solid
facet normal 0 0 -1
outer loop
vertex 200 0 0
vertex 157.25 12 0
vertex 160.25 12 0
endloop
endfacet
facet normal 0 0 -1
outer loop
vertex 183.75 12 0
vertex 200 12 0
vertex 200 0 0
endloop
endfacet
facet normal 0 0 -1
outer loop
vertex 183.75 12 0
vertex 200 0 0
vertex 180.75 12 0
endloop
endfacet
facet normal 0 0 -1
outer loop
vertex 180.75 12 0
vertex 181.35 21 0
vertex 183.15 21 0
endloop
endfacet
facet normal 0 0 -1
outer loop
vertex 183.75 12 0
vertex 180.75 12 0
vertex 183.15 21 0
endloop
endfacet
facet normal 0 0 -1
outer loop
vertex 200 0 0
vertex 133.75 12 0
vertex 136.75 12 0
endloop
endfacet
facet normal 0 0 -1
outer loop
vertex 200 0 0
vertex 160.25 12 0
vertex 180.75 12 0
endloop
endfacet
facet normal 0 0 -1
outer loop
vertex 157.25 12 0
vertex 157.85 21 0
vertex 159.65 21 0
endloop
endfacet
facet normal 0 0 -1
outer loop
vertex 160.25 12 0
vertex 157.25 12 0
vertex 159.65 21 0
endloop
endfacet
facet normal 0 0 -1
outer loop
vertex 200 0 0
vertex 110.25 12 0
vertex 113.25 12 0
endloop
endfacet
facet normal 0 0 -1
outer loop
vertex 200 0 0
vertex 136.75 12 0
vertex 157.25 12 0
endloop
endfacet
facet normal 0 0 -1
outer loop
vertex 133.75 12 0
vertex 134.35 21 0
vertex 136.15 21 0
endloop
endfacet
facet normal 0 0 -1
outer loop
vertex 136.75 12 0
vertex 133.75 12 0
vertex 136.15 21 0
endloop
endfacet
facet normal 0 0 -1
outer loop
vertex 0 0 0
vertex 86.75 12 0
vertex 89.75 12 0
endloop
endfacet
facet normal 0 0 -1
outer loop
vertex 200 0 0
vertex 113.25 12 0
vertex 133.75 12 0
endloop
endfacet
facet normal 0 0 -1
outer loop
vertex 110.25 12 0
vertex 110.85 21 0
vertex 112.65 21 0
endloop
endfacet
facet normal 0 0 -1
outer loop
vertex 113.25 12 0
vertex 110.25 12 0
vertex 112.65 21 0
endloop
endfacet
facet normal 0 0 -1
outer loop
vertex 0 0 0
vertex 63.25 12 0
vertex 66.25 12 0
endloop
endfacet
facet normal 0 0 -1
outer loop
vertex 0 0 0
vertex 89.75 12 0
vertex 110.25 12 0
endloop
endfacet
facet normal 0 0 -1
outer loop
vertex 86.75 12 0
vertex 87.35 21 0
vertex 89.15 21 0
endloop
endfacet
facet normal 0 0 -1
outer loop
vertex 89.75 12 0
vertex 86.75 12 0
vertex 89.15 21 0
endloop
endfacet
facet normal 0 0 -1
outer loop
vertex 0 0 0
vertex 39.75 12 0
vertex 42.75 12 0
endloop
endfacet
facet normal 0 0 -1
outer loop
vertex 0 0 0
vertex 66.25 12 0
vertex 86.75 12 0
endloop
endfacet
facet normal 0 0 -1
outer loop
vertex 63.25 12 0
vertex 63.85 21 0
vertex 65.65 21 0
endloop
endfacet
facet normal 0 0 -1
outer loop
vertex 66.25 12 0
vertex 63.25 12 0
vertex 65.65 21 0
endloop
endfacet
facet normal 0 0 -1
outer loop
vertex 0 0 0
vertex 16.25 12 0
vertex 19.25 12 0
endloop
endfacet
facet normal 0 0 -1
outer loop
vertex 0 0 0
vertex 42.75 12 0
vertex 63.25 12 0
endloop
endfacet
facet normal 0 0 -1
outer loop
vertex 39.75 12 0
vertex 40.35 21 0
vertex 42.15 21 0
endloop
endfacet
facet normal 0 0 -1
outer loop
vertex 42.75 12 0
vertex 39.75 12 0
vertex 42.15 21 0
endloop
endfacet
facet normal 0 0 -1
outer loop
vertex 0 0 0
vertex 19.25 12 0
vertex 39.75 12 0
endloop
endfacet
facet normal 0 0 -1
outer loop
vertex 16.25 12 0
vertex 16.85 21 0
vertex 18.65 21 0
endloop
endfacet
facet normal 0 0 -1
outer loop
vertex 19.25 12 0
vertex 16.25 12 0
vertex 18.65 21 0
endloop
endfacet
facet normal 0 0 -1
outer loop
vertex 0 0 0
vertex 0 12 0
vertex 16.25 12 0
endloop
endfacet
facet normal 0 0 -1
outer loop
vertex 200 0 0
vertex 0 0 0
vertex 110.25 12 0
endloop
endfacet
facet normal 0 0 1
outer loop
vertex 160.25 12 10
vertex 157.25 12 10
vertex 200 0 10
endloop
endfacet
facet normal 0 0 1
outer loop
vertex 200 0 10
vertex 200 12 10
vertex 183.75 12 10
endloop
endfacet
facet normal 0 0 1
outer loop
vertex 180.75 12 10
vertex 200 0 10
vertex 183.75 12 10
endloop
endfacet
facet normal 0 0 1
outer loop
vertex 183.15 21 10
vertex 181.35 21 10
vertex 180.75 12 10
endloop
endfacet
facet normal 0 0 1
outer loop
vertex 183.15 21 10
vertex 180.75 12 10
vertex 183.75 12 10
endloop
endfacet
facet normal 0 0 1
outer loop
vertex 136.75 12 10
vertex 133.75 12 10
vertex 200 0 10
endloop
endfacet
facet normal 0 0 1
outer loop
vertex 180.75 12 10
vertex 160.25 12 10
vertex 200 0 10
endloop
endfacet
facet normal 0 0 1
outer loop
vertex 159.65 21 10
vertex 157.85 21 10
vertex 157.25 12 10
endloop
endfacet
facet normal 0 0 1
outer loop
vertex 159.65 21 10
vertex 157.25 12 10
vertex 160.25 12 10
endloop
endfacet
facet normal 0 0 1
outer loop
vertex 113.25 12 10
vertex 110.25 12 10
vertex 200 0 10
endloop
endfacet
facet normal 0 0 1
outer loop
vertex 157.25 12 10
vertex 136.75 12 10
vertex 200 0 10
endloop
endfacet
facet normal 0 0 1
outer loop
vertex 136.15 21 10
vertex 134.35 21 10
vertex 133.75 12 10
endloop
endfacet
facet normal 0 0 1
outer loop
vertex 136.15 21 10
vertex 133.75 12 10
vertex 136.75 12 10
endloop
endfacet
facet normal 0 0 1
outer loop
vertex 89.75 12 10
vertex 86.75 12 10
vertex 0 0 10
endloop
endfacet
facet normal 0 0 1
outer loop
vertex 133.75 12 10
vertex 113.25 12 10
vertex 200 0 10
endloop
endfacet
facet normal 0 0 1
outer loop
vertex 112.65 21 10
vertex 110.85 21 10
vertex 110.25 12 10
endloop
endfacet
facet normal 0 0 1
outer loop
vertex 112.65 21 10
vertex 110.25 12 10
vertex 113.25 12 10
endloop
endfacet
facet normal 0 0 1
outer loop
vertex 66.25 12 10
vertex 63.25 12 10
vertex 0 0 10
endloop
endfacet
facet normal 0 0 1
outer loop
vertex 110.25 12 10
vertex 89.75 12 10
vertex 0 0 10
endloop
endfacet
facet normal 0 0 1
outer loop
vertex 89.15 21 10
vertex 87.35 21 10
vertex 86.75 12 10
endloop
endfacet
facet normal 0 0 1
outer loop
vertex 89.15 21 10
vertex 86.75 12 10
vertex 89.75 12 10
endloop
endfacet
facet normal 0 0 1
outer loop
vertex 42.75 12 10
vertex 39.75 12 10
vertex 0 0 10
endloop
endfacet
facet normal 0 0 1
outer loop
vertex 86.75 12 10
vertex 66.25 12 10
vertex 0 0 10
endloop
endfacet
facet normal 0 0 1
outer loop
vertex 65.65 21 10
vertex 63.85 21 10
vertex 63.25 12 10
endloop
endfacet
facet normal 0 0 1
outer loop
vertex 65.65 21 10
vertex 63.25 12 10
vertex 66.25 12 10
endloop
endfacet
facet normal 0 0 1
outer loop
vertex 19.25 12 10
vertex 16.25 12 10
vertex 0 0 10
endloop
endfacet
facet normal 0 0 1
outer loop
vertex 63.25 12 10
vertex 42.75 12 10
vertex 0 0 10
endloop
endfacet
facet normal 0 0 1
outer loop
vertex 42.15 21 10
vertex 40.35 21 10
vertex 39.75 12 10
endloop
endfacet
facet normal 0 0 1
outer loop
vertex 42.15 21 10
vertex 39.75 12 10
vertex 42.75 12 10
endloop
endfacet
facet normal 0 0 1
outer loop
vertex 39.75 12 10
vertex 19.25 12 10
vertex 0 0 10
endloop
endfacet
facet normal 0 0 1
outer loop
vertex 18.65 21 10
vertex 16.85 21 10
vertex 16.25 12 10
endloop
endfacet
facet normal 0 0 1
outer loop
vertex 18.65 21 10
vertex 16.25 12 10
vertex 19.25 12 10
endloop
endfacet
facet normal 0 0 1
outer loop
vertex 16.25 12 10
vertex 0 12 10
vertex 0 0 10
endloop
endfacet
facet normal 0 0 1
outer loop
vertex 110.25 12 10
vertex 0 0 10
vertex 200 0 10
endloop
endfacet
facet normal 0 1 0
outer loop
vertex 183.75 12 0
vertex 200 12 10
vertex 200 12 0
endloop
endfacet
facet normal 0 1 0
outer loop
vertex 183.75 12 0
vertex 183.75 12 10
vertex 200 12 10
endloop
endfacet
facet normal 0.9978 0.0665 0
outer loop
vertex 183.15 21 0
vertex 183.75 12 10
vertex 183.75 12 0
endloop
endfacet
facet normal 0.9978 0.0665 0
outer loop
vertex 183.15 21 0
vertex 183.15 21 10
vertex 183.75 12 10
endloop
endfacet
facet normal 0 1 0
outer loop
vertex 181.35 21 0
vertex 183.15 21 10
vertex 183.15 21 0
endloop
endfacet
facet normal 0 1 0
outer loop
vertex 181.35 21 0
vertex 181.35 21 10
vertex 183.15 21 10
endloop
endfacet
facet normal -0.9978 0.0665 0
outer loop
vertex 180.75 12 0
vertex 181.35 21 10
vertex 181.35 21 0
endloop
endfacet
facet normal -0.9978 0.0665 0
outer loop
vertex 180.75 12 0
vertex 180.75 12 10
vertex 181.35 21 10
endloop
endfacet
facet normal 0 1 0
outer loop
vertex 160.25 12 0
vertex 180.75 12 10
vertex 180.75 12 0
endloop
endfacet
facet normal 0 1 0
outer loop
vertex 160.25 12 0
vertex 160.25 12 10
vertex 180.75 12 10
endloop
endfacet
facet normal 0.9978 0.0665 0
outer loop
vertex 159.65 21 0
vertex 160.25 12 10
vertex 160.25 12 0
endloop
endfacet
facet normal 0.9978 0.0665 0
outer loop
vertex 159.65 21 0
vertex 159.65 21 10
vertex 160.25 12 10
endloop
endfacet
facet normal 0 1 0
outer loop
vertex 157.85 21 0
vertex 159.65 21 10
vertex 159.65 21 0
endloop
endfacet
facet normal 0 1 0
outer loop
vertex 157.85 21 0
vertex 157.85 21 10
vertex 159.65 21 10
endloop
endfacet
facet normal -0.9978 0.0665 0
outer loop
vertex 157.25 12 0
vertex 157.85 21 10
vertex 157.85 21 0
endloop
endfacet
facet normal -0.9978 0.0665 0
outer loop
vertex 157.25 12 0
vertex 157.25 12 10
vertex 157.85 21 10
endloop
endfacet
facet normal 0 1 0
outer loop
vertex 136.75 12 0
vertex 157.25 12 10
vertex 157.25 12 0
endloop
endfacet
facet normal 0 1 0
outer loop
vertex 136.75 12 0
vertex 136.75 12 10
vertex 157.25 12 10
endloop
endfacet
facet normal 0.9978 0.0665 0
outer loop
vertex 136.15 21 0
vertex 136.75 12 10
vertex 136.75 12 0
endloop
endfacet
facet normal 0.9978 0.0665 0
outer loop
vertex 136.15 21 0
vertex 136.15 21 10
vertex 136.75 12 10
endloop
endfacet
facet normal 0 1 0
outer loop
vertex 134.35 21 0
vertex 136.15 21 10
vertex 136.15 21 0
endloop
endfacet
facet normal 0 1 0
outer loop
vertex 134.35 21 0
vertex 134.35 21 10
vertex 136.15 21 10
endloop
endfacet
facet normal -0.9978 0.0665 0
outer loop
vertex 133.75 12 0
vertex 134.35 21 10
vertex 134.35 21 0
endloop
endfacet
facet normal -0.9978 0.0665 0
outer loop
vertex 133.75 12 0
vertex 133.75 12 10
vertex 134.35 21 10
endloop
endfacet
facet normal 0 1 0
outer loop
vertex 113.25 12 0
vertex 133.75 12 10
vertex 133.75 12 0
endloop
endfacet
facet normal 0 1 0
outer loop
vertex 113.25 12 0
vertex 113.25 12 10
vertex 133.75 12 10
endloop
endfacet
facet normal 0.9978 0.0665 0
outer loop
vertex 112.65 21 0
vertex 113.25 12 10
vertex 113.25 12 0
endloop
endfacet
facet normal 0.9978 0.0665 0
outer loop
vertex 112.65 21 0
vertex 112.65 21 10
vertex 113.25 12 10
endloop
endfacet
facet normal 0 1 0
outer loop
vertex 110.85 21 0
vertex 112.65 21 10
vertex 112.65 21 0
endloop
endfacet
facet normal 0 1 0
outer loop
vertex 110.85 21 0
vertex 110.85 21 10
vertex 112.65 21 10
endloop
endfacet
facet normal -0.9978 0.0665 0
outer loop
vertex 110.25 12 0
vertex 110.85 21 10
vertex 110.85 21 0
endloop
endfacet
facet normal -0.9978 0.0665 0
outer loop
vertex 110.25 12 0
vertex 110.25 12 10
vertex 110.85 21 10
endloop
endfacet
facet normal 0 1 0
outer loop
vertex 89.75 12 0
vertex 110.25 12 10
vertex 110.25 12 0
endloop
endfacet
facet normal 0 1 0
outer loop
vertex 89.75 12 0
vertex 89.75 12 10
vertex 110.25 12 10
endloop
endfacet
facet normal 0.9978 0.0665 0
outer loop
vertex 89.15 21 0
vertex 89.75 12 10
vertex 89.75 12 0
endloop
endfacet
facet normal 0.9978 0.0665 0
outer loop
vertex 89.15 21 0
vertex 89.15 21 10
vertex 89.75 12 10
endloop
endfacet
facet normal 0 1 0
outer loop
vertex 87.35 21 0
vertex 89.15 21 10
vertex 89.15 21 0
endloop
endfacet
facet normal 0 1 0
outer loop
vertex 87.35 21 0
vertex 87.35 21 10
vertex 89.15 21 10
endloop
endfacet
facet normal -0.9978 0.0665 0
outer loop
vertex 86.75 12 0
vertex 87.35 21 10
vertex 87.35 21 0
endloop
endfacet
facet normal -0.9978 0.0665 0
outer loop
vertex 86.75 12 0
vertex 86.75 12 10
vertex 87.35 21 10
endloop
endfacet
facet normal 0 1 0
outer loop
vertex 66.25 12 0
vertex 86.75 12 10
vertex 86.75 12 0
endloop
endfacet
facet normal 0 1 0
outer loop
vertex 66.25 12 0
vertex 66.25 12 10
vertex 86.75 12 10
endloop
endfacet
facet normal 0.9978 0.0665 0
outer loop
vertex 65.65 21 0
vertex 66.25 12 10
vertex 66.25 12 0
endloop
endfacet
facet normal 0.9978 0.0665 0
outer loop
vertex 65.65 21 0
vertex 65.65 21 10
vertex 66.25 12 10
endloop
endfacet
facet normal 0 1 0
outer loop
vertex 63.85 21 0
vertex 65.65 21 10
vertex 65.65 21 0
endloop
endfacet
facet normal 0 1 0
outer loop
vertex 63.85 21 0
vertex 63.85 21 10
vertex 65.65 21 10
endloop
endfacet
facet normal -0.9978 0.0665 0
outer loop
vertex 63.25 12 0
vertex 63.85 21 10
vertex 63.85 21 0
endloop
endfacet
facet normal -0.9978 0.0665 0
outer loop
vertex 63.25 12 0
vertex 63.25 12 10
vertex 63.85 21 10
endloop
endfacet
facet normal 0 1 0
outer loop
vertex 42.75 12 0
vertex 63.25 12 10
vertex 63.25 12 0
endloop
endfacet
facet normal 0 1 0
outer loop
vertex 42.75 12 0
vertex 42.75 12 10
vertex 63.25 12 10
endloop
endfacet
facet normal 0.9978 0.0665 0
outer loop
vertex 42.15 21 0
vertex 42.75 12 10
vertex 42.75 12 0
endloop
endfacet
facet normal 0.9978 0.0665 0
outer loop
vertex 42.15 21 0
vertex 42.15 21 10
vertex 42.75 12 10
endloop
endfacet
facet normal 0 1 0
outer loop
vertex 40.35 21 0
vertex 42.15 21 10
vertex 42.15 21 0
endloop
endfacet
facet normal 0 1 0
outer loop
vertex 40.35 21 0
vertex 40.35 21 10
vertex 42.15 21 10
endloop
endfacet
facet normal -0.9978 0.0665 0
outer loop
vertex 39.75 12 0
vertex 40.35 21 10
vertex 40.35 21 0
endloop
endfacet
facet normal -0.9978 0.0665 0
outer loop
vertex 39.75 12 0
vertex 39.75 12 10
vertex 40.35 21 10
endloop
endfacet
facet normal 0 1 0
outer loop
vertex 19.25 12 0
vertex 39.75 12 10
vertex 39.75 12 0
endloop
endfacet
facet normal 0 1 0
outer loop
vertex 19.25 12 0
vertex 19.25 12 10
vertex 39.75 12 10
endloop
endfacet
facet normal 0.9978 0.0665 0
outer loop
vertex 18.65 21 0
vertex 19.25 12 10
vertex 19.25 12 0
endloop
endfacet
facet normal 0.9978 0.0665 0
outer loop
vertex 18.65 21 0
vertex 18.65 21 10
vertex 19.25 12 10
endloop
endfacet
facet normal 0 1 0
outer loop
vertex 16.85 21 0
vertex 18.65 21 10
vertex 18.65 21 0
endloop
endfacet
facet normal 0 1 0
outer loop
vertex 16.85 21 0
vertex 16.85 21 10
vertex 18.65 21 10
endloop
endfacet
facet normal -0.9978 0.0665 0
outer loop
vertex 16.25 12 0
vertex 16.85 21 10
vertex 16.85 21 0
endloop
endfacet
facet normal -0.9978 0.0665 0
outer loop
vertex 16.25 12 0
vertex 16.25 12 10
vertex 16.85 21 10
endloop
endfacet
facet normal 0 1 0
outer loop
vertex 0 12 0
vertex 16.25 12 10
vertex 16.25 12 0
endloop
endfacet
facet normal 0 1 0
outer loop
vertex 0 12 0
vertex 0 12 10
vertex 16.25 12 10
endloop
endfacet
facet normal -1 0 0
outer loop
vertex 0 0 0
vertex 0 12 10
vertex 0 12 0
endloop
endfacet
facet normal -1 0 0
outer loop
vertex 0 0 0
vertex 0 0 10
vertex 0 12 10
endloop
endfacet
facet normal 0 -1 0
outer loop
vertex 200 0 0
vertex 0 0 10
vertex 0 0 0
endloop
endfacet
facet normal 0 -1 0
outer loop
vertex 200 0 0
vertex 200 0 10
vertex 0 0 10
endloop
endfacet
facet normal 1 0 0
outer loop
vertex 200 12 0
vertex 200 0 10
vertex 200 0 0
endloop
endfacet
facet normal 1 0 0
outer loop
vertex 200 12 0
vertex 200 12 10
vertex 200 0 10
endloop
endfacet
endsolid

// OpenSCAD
$fn = 32;

// ----------------------------------------------------------------------
// Gear rack: 8 teeth on a 200 mm bar, pitch 23.5 mm
// ----------------------------------------------------------------------

// --- parameters (mm) ---
profile_height = 10;      // extrusion height
profile_points = 36;      // points of the closed outline

profile = [[0, 0], [200, 0], [200, 12], [183.75, 12], [183.15, 21], [181.35, 21], [180.75, 12], [160.25, 12], [159.65, 21], [157.85, 21], [157.25, 12], [136.75, 12], [136.15, 21], [134.35, 21], [133.75, 12], [113.25, 12], [112.65, 21], [110.85, 21], [110.25, 12], [89.75, 12], [89.15, 21], [87.35, 21], [86.75, 12], [66.25, 12], [65.65, 21], [63.85, 21], [63.25, 12], [42.75, 12], [42.15, 21], [40.35, 21], [39.75, 12], [19.25, 12], [18.65, 21], [16.85, 21], [16.25, 12], [0, 12]];  // single closed polygon, 36 points, counter clockwise

// --- the one profile operation ---
linear_extrude(height = profile_height) polygon(points = profile);
